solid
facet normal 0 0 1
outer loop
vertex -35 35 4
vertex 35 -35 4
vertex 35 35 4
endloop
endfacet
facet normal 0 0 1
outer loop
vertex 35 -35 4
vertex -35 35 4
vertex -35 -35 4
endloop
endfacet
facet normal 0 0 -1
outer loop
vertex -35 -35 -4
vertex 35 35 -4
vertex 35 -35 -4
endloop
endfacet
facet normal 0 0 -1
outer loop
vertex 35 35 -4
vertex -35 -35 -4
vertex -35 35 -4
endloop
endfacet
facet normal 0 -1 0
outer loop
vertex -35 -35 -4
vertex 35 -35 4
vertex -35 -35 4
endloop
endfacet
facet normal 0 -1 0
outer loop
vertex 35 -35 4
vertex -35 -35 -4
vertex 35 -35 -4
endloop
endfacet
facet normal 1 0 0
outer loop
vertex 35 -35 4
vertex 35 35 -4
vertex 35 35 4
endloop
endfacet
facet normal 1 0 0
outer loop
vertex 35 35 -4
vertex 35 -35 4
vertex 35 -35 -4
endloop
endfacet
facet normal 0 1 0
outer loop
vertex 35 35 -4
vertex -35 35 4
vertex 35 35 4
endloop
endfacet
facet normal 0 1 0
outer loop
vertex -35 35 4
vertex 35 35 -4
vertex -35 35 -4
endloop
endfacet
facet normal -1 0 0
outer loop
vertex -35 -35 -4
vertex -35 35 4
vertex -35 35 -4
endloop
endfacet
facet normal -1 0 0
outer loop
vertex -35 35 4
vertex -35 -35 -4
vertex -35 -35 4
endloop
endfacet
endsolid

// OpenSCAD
// Starter file for task-017.
// Edit this file in OpenSCAD to complete the requested hard task.
$fn = 64;

tile = [70, 70, 8];
cube(tile, center=true);
